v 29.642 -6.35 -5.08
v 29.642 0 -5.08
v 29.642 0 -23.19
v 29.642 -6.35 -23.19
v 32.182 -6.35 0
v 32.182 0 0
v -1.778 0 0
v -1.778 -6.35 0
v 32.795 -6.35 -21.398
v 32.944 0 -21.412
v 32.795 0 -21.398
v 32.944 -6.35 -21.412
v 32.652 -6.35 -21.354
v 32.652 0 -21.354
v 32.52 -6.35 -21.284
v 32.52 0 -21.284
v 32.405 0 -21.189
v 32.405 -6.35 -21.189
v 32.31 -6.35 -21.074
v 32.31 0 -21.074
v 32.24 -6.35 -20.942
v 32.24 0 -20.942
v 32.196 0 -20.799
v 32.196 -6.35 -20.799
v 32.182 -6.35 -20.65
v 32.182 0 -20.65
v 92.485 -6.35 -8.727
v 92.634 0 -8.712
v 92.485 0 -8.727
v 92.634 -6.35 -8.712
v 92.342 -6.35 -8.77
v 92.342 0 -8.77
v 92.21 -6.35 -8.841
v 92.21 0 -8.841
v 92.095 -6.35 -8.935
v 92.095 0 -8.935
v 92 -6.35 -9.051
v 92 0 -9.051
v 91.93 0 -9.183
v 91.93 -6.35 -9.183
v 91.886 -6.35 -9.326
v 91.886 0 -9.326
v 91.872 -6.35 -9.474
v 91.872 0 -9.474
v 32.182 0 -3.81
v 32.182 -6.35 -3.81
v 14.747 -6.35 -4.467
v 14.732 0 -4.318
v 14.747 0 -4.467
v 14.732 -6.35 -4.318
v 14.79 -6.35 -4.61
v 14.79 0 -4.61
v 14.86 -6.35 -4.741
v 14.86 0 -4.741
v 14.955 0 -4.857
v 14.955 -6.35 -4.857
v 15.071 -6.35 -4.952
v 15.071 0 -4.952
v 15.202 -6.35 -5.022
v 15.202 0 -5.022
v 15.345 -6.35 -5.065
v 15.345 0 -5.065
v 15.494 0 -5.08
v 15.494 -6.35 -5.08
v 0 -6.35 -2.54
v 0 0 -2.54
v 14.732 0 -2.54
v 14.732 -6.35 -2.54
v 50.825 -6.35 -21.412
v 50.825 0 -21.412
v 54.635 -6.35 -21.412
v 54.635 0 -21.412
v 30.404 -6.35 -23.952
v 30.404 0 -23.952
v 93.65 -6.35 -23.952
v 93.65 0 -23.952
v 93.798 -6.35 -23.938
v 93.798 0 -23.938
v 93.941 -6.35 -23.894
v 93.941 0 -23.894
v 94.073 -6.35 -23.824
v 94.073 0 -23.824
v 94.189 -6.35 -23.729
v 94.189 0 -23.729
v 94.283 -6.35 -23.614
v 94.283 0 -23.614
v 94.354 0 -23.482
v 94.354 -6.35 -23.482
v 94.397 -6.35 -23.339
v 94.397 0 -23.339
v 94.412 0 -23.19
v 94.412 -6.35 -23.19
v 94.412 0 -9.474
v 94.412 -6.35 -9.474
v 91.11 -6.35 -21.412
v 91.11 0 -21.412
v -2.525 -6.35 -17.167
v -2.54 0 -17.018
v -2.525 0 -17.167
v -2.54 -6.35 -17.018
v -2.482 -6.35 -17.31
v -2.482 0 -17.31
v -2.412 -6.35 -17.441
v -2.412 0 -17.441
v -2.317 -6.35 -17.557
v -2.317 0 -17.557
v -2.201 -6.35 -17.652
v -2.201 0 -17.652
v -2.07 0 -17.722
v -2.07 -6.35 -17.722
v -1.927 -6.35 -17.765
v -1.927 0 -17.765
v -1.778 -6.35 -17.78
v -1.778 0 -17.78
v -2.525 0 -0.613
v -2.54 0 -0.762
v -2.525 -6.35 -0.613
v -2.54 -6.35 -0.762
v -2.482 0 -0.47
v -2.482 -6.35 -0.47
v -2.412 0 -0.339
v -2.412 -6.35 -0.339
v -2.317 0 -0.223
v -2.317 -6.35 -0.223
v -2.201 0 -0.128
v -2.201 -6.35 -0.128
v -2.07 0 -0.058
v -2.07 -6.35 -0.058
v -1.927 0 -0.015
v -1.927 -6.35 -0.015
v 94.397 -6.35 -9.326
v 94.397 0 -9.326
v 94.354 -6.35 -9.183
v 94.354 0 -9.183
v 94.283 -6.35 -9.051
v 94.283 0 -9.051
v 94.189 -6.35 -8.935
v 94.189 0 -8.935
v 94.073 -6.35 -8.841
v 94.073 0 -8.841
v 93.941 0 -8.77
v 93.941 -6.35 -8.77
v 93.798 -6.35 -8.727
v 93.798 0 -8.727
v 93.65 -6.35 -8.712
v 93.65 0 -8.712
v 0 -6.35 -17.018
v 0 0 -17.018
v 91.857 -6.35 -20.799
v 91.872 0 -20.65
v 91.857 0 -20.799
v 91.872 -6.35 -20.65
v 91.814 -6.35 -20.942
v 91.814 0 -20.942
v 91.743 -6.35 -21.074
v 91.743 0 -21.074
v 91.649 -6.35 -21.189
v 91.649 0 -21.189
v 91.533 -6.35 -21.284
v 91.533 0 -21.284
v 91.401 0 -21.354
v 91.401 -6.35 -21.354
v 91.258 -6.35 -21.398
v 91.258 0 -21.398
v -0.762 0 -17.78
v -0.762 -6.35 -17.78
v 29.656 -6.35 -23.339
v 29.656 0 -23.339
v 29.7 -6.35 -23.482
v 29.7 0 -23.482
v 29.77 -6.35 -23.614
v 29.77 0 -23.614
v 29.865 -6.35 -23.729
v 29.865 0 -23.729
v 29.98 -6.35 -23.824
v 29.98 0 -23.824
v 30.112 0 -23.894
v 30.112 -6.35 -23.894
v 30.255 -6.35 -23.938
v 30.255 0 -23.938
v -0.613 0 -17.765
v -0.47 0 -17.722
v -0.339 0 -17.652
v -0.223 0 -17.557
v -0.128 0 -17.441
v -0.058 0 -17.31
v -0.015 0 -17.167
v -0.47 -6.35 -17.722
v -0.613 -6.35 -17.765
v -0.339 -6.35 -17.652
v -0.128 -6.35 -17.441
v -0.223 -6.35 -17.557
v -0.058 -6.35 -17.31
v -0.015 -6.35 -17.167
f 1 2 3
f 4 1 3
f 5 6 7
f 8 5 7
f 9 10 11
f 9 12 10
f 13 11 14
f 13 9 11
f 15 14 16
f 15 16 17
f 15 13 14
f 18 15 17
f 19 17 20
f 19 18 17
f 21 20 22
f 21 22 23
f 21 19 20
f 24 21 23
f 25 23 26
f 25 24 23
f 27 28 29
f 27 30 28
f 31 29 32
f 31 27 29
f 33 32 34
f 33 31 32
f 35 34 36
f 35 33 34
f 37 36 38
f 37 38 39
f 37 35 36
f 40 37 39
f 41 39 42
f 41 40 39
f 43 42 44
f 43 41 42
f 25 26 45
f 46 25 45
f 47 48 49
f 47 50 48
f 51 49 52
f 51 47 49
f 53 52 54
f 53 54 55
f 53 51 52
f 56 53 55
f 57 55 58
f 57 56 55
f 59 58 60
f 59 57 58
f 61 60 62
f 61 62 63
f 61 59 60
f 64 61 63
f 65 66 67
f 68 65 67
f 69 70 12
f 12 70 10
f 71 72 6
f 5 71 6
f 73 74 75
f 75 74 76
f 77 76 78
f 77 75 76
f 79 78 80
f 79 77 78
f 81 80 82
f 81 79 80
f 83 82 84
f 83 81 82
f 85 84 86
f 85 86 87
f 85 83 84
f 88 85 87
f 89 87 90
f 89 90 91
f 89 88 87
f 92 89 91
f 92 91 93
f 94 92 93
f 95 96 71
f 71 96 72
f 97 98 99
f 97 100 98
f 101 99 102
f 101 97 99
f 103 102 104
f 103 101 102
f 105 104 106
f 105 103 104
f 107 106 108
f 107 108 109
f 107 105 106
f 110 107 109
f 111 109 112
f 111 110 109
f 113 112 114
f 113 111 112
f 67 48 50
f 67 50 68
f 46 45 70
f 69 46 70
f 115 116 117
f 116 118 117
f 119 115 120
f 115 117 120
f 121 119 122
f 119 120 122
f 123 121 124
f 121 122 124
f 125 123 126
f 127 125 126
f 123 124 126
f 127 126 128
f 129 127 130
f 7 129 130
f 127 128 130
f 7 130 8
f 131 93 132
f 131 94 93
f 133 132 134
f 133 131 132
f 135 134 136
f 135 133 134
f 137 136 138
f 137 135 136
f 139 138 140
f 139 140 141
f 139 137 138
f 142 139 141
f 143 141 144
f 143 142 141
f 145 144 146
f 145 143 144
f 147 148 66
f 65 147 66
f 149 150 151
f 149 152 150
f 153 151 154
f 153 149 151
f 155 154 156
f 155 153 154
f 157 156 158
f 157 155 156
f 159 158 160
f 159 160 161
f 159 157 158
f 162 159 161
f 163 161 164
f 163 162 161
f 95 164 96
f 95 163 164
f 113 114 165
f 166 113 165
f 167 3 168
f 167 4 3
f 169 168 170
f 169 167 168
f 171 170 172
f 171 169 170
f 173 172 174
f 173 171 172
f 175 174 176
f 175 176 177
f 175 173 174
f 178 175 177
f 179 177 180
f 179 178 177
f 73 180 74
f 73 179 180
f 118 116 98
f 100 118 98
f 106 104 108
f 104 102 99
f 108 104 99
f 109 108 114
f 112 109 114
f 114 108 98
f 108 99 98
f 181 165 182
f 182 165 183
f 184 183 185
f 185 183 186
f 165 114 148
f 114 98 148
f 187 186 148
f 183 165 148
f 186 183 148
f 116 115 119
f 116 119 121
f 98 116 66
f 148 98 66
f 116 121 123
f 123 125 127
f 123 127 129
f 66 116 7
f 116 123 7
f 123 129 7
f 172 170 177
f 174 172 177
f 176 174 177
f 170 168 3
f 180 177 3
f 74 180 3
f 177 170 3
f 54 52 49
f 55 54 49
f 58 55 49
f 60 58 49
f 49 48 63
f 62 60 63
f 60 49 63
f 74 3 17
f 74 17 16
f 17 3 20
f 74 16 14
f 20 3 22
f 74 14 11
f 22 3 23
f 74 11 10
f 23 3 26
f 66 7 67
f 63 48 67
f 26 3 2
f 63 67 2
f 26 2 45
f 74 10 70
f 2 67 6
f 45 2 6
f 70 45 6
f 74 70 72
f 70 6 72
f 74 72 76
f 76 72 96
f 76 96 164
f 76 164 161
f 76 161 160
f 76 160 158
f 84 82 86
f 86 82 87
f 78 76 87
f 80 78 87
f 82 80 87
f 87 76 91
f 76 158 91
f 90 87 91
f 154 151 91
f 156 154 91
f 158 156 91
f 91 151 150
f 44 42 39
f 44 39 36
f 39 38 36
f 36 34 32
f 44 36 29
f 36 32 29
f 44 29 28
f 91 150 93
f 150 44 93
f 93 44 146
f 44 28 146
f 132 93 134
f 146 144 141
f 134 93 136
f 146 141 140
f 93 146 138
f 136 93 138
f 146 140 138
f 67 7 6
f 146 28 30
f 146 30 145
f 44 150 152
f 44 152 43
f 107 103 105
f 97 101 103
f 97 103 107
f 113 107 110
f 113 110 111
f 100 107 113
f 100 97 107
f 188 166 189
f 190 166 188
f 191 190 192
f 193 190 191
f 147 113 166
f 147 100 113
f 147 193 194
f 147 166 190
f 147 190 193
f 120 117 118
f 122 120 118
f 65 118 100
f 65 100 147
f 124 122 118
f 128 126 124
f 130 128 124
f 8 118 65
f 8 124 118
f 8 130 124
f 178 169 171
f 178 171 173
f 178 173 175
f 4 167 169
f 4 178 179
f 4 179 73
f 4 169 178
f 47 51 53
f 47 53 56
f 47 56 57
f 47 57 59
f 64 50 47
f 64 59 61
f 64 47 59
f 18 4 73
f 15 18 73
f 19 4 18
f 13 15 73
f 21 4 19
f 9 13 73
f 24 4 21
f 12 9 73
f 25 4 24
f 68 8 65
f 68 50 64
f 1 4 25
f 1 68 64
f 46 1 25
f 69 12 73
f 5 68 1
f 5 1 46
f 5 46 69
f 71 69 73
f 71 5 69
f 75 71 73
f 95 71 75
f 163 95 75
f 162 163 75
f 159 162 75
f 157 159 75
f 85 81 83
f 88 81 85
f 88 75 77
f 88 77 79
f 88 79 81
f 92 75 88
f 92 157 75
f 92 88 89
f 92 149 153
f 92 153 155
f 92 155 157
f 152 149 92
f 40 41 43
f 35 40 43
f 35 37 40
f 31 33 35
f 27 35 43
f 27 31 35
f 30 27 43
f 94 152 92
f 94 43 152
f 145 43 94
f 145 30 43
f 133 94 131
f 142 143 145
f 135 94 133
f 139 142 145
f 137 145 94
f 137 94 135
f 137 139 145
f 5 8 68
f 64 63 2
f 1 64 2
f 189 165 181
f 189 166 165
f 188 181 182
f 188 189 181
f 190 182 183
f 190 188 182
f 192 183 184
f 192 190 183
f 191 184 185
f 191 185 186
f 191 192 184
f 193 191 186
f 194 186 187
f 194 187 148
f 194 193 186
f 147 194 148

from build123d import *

# Parameters (mm, degrees)
F0_W     = 14.9098
F0_H     = 2.54
F0_W_2   = 2.54
F0_H_2   = 12.7
F1_DEPTH = 6.35
F2_R     = 0.762


with BuildPart() as f1:
    # F0 (on Front) → F1 (new body)
    with BuildSketch(Plane.XZ):
        Polygon((0, -2.54), (0, 0), (-2.54, 0), (-2.54, -17.78), (0, -17.78), align=None)
        Polygon((29.6418, 0), (0, 0), (0, -2.54), (14.732, -2.54), (29.6418, -2.54), align=None)
        with Locations((22.1869, -3.81)):
            Rectangle(F0_W, F0_H)
        Polygon((32.1818, 0), (29.6418, 0), (29.6418, -2.54), (29.6418, -5.08), (29.6418, -23.9522), (32.1818, -23.9522), (32.1818, -21.4122), (32.1818, -3.81), align=None)
        Polygon((91.8718, -21.4122), (54.6354, -21.4122), (50.8254, -21.4122), (32.1818, -21.4122), (32.1818, -23.9522), (94.4118, -23.9522), (94.4118, -21.4122), align=None)
        with Locations((93.1418, -15.0622)):
            Rectangle(F0_W_2, F0_H_2)
        Polygon((54.6354, -21.4122), (32.1818, 0), (32.1818, -3.81), (50.8254, -21.4122), align=None)
    extrude(amount=F1_DEPTH)

    # F2
    f2_edges = [f1.edges().sort_by_distance(p)[0] for p in [
        (-2.54, -3.175, -17.78),
        (0, -3.175, -17.78),
        (-2.54, -3.175, 0),
        (32.1818, -3.175, -21.4122),
        (14.732, -3.175, -5.08),
        (29.6418, -3.175, -23.9522),
        (94.4118, -3.175, -23.9522),
        (94.4118, -3.175, -8.7122),
        (91.8718, -3.175, -8.7122),
        (91.8718, -3.175, -21.4122),
    ]]
    fillet(f2_edges, radius=F2_R)


solid = f1.part
